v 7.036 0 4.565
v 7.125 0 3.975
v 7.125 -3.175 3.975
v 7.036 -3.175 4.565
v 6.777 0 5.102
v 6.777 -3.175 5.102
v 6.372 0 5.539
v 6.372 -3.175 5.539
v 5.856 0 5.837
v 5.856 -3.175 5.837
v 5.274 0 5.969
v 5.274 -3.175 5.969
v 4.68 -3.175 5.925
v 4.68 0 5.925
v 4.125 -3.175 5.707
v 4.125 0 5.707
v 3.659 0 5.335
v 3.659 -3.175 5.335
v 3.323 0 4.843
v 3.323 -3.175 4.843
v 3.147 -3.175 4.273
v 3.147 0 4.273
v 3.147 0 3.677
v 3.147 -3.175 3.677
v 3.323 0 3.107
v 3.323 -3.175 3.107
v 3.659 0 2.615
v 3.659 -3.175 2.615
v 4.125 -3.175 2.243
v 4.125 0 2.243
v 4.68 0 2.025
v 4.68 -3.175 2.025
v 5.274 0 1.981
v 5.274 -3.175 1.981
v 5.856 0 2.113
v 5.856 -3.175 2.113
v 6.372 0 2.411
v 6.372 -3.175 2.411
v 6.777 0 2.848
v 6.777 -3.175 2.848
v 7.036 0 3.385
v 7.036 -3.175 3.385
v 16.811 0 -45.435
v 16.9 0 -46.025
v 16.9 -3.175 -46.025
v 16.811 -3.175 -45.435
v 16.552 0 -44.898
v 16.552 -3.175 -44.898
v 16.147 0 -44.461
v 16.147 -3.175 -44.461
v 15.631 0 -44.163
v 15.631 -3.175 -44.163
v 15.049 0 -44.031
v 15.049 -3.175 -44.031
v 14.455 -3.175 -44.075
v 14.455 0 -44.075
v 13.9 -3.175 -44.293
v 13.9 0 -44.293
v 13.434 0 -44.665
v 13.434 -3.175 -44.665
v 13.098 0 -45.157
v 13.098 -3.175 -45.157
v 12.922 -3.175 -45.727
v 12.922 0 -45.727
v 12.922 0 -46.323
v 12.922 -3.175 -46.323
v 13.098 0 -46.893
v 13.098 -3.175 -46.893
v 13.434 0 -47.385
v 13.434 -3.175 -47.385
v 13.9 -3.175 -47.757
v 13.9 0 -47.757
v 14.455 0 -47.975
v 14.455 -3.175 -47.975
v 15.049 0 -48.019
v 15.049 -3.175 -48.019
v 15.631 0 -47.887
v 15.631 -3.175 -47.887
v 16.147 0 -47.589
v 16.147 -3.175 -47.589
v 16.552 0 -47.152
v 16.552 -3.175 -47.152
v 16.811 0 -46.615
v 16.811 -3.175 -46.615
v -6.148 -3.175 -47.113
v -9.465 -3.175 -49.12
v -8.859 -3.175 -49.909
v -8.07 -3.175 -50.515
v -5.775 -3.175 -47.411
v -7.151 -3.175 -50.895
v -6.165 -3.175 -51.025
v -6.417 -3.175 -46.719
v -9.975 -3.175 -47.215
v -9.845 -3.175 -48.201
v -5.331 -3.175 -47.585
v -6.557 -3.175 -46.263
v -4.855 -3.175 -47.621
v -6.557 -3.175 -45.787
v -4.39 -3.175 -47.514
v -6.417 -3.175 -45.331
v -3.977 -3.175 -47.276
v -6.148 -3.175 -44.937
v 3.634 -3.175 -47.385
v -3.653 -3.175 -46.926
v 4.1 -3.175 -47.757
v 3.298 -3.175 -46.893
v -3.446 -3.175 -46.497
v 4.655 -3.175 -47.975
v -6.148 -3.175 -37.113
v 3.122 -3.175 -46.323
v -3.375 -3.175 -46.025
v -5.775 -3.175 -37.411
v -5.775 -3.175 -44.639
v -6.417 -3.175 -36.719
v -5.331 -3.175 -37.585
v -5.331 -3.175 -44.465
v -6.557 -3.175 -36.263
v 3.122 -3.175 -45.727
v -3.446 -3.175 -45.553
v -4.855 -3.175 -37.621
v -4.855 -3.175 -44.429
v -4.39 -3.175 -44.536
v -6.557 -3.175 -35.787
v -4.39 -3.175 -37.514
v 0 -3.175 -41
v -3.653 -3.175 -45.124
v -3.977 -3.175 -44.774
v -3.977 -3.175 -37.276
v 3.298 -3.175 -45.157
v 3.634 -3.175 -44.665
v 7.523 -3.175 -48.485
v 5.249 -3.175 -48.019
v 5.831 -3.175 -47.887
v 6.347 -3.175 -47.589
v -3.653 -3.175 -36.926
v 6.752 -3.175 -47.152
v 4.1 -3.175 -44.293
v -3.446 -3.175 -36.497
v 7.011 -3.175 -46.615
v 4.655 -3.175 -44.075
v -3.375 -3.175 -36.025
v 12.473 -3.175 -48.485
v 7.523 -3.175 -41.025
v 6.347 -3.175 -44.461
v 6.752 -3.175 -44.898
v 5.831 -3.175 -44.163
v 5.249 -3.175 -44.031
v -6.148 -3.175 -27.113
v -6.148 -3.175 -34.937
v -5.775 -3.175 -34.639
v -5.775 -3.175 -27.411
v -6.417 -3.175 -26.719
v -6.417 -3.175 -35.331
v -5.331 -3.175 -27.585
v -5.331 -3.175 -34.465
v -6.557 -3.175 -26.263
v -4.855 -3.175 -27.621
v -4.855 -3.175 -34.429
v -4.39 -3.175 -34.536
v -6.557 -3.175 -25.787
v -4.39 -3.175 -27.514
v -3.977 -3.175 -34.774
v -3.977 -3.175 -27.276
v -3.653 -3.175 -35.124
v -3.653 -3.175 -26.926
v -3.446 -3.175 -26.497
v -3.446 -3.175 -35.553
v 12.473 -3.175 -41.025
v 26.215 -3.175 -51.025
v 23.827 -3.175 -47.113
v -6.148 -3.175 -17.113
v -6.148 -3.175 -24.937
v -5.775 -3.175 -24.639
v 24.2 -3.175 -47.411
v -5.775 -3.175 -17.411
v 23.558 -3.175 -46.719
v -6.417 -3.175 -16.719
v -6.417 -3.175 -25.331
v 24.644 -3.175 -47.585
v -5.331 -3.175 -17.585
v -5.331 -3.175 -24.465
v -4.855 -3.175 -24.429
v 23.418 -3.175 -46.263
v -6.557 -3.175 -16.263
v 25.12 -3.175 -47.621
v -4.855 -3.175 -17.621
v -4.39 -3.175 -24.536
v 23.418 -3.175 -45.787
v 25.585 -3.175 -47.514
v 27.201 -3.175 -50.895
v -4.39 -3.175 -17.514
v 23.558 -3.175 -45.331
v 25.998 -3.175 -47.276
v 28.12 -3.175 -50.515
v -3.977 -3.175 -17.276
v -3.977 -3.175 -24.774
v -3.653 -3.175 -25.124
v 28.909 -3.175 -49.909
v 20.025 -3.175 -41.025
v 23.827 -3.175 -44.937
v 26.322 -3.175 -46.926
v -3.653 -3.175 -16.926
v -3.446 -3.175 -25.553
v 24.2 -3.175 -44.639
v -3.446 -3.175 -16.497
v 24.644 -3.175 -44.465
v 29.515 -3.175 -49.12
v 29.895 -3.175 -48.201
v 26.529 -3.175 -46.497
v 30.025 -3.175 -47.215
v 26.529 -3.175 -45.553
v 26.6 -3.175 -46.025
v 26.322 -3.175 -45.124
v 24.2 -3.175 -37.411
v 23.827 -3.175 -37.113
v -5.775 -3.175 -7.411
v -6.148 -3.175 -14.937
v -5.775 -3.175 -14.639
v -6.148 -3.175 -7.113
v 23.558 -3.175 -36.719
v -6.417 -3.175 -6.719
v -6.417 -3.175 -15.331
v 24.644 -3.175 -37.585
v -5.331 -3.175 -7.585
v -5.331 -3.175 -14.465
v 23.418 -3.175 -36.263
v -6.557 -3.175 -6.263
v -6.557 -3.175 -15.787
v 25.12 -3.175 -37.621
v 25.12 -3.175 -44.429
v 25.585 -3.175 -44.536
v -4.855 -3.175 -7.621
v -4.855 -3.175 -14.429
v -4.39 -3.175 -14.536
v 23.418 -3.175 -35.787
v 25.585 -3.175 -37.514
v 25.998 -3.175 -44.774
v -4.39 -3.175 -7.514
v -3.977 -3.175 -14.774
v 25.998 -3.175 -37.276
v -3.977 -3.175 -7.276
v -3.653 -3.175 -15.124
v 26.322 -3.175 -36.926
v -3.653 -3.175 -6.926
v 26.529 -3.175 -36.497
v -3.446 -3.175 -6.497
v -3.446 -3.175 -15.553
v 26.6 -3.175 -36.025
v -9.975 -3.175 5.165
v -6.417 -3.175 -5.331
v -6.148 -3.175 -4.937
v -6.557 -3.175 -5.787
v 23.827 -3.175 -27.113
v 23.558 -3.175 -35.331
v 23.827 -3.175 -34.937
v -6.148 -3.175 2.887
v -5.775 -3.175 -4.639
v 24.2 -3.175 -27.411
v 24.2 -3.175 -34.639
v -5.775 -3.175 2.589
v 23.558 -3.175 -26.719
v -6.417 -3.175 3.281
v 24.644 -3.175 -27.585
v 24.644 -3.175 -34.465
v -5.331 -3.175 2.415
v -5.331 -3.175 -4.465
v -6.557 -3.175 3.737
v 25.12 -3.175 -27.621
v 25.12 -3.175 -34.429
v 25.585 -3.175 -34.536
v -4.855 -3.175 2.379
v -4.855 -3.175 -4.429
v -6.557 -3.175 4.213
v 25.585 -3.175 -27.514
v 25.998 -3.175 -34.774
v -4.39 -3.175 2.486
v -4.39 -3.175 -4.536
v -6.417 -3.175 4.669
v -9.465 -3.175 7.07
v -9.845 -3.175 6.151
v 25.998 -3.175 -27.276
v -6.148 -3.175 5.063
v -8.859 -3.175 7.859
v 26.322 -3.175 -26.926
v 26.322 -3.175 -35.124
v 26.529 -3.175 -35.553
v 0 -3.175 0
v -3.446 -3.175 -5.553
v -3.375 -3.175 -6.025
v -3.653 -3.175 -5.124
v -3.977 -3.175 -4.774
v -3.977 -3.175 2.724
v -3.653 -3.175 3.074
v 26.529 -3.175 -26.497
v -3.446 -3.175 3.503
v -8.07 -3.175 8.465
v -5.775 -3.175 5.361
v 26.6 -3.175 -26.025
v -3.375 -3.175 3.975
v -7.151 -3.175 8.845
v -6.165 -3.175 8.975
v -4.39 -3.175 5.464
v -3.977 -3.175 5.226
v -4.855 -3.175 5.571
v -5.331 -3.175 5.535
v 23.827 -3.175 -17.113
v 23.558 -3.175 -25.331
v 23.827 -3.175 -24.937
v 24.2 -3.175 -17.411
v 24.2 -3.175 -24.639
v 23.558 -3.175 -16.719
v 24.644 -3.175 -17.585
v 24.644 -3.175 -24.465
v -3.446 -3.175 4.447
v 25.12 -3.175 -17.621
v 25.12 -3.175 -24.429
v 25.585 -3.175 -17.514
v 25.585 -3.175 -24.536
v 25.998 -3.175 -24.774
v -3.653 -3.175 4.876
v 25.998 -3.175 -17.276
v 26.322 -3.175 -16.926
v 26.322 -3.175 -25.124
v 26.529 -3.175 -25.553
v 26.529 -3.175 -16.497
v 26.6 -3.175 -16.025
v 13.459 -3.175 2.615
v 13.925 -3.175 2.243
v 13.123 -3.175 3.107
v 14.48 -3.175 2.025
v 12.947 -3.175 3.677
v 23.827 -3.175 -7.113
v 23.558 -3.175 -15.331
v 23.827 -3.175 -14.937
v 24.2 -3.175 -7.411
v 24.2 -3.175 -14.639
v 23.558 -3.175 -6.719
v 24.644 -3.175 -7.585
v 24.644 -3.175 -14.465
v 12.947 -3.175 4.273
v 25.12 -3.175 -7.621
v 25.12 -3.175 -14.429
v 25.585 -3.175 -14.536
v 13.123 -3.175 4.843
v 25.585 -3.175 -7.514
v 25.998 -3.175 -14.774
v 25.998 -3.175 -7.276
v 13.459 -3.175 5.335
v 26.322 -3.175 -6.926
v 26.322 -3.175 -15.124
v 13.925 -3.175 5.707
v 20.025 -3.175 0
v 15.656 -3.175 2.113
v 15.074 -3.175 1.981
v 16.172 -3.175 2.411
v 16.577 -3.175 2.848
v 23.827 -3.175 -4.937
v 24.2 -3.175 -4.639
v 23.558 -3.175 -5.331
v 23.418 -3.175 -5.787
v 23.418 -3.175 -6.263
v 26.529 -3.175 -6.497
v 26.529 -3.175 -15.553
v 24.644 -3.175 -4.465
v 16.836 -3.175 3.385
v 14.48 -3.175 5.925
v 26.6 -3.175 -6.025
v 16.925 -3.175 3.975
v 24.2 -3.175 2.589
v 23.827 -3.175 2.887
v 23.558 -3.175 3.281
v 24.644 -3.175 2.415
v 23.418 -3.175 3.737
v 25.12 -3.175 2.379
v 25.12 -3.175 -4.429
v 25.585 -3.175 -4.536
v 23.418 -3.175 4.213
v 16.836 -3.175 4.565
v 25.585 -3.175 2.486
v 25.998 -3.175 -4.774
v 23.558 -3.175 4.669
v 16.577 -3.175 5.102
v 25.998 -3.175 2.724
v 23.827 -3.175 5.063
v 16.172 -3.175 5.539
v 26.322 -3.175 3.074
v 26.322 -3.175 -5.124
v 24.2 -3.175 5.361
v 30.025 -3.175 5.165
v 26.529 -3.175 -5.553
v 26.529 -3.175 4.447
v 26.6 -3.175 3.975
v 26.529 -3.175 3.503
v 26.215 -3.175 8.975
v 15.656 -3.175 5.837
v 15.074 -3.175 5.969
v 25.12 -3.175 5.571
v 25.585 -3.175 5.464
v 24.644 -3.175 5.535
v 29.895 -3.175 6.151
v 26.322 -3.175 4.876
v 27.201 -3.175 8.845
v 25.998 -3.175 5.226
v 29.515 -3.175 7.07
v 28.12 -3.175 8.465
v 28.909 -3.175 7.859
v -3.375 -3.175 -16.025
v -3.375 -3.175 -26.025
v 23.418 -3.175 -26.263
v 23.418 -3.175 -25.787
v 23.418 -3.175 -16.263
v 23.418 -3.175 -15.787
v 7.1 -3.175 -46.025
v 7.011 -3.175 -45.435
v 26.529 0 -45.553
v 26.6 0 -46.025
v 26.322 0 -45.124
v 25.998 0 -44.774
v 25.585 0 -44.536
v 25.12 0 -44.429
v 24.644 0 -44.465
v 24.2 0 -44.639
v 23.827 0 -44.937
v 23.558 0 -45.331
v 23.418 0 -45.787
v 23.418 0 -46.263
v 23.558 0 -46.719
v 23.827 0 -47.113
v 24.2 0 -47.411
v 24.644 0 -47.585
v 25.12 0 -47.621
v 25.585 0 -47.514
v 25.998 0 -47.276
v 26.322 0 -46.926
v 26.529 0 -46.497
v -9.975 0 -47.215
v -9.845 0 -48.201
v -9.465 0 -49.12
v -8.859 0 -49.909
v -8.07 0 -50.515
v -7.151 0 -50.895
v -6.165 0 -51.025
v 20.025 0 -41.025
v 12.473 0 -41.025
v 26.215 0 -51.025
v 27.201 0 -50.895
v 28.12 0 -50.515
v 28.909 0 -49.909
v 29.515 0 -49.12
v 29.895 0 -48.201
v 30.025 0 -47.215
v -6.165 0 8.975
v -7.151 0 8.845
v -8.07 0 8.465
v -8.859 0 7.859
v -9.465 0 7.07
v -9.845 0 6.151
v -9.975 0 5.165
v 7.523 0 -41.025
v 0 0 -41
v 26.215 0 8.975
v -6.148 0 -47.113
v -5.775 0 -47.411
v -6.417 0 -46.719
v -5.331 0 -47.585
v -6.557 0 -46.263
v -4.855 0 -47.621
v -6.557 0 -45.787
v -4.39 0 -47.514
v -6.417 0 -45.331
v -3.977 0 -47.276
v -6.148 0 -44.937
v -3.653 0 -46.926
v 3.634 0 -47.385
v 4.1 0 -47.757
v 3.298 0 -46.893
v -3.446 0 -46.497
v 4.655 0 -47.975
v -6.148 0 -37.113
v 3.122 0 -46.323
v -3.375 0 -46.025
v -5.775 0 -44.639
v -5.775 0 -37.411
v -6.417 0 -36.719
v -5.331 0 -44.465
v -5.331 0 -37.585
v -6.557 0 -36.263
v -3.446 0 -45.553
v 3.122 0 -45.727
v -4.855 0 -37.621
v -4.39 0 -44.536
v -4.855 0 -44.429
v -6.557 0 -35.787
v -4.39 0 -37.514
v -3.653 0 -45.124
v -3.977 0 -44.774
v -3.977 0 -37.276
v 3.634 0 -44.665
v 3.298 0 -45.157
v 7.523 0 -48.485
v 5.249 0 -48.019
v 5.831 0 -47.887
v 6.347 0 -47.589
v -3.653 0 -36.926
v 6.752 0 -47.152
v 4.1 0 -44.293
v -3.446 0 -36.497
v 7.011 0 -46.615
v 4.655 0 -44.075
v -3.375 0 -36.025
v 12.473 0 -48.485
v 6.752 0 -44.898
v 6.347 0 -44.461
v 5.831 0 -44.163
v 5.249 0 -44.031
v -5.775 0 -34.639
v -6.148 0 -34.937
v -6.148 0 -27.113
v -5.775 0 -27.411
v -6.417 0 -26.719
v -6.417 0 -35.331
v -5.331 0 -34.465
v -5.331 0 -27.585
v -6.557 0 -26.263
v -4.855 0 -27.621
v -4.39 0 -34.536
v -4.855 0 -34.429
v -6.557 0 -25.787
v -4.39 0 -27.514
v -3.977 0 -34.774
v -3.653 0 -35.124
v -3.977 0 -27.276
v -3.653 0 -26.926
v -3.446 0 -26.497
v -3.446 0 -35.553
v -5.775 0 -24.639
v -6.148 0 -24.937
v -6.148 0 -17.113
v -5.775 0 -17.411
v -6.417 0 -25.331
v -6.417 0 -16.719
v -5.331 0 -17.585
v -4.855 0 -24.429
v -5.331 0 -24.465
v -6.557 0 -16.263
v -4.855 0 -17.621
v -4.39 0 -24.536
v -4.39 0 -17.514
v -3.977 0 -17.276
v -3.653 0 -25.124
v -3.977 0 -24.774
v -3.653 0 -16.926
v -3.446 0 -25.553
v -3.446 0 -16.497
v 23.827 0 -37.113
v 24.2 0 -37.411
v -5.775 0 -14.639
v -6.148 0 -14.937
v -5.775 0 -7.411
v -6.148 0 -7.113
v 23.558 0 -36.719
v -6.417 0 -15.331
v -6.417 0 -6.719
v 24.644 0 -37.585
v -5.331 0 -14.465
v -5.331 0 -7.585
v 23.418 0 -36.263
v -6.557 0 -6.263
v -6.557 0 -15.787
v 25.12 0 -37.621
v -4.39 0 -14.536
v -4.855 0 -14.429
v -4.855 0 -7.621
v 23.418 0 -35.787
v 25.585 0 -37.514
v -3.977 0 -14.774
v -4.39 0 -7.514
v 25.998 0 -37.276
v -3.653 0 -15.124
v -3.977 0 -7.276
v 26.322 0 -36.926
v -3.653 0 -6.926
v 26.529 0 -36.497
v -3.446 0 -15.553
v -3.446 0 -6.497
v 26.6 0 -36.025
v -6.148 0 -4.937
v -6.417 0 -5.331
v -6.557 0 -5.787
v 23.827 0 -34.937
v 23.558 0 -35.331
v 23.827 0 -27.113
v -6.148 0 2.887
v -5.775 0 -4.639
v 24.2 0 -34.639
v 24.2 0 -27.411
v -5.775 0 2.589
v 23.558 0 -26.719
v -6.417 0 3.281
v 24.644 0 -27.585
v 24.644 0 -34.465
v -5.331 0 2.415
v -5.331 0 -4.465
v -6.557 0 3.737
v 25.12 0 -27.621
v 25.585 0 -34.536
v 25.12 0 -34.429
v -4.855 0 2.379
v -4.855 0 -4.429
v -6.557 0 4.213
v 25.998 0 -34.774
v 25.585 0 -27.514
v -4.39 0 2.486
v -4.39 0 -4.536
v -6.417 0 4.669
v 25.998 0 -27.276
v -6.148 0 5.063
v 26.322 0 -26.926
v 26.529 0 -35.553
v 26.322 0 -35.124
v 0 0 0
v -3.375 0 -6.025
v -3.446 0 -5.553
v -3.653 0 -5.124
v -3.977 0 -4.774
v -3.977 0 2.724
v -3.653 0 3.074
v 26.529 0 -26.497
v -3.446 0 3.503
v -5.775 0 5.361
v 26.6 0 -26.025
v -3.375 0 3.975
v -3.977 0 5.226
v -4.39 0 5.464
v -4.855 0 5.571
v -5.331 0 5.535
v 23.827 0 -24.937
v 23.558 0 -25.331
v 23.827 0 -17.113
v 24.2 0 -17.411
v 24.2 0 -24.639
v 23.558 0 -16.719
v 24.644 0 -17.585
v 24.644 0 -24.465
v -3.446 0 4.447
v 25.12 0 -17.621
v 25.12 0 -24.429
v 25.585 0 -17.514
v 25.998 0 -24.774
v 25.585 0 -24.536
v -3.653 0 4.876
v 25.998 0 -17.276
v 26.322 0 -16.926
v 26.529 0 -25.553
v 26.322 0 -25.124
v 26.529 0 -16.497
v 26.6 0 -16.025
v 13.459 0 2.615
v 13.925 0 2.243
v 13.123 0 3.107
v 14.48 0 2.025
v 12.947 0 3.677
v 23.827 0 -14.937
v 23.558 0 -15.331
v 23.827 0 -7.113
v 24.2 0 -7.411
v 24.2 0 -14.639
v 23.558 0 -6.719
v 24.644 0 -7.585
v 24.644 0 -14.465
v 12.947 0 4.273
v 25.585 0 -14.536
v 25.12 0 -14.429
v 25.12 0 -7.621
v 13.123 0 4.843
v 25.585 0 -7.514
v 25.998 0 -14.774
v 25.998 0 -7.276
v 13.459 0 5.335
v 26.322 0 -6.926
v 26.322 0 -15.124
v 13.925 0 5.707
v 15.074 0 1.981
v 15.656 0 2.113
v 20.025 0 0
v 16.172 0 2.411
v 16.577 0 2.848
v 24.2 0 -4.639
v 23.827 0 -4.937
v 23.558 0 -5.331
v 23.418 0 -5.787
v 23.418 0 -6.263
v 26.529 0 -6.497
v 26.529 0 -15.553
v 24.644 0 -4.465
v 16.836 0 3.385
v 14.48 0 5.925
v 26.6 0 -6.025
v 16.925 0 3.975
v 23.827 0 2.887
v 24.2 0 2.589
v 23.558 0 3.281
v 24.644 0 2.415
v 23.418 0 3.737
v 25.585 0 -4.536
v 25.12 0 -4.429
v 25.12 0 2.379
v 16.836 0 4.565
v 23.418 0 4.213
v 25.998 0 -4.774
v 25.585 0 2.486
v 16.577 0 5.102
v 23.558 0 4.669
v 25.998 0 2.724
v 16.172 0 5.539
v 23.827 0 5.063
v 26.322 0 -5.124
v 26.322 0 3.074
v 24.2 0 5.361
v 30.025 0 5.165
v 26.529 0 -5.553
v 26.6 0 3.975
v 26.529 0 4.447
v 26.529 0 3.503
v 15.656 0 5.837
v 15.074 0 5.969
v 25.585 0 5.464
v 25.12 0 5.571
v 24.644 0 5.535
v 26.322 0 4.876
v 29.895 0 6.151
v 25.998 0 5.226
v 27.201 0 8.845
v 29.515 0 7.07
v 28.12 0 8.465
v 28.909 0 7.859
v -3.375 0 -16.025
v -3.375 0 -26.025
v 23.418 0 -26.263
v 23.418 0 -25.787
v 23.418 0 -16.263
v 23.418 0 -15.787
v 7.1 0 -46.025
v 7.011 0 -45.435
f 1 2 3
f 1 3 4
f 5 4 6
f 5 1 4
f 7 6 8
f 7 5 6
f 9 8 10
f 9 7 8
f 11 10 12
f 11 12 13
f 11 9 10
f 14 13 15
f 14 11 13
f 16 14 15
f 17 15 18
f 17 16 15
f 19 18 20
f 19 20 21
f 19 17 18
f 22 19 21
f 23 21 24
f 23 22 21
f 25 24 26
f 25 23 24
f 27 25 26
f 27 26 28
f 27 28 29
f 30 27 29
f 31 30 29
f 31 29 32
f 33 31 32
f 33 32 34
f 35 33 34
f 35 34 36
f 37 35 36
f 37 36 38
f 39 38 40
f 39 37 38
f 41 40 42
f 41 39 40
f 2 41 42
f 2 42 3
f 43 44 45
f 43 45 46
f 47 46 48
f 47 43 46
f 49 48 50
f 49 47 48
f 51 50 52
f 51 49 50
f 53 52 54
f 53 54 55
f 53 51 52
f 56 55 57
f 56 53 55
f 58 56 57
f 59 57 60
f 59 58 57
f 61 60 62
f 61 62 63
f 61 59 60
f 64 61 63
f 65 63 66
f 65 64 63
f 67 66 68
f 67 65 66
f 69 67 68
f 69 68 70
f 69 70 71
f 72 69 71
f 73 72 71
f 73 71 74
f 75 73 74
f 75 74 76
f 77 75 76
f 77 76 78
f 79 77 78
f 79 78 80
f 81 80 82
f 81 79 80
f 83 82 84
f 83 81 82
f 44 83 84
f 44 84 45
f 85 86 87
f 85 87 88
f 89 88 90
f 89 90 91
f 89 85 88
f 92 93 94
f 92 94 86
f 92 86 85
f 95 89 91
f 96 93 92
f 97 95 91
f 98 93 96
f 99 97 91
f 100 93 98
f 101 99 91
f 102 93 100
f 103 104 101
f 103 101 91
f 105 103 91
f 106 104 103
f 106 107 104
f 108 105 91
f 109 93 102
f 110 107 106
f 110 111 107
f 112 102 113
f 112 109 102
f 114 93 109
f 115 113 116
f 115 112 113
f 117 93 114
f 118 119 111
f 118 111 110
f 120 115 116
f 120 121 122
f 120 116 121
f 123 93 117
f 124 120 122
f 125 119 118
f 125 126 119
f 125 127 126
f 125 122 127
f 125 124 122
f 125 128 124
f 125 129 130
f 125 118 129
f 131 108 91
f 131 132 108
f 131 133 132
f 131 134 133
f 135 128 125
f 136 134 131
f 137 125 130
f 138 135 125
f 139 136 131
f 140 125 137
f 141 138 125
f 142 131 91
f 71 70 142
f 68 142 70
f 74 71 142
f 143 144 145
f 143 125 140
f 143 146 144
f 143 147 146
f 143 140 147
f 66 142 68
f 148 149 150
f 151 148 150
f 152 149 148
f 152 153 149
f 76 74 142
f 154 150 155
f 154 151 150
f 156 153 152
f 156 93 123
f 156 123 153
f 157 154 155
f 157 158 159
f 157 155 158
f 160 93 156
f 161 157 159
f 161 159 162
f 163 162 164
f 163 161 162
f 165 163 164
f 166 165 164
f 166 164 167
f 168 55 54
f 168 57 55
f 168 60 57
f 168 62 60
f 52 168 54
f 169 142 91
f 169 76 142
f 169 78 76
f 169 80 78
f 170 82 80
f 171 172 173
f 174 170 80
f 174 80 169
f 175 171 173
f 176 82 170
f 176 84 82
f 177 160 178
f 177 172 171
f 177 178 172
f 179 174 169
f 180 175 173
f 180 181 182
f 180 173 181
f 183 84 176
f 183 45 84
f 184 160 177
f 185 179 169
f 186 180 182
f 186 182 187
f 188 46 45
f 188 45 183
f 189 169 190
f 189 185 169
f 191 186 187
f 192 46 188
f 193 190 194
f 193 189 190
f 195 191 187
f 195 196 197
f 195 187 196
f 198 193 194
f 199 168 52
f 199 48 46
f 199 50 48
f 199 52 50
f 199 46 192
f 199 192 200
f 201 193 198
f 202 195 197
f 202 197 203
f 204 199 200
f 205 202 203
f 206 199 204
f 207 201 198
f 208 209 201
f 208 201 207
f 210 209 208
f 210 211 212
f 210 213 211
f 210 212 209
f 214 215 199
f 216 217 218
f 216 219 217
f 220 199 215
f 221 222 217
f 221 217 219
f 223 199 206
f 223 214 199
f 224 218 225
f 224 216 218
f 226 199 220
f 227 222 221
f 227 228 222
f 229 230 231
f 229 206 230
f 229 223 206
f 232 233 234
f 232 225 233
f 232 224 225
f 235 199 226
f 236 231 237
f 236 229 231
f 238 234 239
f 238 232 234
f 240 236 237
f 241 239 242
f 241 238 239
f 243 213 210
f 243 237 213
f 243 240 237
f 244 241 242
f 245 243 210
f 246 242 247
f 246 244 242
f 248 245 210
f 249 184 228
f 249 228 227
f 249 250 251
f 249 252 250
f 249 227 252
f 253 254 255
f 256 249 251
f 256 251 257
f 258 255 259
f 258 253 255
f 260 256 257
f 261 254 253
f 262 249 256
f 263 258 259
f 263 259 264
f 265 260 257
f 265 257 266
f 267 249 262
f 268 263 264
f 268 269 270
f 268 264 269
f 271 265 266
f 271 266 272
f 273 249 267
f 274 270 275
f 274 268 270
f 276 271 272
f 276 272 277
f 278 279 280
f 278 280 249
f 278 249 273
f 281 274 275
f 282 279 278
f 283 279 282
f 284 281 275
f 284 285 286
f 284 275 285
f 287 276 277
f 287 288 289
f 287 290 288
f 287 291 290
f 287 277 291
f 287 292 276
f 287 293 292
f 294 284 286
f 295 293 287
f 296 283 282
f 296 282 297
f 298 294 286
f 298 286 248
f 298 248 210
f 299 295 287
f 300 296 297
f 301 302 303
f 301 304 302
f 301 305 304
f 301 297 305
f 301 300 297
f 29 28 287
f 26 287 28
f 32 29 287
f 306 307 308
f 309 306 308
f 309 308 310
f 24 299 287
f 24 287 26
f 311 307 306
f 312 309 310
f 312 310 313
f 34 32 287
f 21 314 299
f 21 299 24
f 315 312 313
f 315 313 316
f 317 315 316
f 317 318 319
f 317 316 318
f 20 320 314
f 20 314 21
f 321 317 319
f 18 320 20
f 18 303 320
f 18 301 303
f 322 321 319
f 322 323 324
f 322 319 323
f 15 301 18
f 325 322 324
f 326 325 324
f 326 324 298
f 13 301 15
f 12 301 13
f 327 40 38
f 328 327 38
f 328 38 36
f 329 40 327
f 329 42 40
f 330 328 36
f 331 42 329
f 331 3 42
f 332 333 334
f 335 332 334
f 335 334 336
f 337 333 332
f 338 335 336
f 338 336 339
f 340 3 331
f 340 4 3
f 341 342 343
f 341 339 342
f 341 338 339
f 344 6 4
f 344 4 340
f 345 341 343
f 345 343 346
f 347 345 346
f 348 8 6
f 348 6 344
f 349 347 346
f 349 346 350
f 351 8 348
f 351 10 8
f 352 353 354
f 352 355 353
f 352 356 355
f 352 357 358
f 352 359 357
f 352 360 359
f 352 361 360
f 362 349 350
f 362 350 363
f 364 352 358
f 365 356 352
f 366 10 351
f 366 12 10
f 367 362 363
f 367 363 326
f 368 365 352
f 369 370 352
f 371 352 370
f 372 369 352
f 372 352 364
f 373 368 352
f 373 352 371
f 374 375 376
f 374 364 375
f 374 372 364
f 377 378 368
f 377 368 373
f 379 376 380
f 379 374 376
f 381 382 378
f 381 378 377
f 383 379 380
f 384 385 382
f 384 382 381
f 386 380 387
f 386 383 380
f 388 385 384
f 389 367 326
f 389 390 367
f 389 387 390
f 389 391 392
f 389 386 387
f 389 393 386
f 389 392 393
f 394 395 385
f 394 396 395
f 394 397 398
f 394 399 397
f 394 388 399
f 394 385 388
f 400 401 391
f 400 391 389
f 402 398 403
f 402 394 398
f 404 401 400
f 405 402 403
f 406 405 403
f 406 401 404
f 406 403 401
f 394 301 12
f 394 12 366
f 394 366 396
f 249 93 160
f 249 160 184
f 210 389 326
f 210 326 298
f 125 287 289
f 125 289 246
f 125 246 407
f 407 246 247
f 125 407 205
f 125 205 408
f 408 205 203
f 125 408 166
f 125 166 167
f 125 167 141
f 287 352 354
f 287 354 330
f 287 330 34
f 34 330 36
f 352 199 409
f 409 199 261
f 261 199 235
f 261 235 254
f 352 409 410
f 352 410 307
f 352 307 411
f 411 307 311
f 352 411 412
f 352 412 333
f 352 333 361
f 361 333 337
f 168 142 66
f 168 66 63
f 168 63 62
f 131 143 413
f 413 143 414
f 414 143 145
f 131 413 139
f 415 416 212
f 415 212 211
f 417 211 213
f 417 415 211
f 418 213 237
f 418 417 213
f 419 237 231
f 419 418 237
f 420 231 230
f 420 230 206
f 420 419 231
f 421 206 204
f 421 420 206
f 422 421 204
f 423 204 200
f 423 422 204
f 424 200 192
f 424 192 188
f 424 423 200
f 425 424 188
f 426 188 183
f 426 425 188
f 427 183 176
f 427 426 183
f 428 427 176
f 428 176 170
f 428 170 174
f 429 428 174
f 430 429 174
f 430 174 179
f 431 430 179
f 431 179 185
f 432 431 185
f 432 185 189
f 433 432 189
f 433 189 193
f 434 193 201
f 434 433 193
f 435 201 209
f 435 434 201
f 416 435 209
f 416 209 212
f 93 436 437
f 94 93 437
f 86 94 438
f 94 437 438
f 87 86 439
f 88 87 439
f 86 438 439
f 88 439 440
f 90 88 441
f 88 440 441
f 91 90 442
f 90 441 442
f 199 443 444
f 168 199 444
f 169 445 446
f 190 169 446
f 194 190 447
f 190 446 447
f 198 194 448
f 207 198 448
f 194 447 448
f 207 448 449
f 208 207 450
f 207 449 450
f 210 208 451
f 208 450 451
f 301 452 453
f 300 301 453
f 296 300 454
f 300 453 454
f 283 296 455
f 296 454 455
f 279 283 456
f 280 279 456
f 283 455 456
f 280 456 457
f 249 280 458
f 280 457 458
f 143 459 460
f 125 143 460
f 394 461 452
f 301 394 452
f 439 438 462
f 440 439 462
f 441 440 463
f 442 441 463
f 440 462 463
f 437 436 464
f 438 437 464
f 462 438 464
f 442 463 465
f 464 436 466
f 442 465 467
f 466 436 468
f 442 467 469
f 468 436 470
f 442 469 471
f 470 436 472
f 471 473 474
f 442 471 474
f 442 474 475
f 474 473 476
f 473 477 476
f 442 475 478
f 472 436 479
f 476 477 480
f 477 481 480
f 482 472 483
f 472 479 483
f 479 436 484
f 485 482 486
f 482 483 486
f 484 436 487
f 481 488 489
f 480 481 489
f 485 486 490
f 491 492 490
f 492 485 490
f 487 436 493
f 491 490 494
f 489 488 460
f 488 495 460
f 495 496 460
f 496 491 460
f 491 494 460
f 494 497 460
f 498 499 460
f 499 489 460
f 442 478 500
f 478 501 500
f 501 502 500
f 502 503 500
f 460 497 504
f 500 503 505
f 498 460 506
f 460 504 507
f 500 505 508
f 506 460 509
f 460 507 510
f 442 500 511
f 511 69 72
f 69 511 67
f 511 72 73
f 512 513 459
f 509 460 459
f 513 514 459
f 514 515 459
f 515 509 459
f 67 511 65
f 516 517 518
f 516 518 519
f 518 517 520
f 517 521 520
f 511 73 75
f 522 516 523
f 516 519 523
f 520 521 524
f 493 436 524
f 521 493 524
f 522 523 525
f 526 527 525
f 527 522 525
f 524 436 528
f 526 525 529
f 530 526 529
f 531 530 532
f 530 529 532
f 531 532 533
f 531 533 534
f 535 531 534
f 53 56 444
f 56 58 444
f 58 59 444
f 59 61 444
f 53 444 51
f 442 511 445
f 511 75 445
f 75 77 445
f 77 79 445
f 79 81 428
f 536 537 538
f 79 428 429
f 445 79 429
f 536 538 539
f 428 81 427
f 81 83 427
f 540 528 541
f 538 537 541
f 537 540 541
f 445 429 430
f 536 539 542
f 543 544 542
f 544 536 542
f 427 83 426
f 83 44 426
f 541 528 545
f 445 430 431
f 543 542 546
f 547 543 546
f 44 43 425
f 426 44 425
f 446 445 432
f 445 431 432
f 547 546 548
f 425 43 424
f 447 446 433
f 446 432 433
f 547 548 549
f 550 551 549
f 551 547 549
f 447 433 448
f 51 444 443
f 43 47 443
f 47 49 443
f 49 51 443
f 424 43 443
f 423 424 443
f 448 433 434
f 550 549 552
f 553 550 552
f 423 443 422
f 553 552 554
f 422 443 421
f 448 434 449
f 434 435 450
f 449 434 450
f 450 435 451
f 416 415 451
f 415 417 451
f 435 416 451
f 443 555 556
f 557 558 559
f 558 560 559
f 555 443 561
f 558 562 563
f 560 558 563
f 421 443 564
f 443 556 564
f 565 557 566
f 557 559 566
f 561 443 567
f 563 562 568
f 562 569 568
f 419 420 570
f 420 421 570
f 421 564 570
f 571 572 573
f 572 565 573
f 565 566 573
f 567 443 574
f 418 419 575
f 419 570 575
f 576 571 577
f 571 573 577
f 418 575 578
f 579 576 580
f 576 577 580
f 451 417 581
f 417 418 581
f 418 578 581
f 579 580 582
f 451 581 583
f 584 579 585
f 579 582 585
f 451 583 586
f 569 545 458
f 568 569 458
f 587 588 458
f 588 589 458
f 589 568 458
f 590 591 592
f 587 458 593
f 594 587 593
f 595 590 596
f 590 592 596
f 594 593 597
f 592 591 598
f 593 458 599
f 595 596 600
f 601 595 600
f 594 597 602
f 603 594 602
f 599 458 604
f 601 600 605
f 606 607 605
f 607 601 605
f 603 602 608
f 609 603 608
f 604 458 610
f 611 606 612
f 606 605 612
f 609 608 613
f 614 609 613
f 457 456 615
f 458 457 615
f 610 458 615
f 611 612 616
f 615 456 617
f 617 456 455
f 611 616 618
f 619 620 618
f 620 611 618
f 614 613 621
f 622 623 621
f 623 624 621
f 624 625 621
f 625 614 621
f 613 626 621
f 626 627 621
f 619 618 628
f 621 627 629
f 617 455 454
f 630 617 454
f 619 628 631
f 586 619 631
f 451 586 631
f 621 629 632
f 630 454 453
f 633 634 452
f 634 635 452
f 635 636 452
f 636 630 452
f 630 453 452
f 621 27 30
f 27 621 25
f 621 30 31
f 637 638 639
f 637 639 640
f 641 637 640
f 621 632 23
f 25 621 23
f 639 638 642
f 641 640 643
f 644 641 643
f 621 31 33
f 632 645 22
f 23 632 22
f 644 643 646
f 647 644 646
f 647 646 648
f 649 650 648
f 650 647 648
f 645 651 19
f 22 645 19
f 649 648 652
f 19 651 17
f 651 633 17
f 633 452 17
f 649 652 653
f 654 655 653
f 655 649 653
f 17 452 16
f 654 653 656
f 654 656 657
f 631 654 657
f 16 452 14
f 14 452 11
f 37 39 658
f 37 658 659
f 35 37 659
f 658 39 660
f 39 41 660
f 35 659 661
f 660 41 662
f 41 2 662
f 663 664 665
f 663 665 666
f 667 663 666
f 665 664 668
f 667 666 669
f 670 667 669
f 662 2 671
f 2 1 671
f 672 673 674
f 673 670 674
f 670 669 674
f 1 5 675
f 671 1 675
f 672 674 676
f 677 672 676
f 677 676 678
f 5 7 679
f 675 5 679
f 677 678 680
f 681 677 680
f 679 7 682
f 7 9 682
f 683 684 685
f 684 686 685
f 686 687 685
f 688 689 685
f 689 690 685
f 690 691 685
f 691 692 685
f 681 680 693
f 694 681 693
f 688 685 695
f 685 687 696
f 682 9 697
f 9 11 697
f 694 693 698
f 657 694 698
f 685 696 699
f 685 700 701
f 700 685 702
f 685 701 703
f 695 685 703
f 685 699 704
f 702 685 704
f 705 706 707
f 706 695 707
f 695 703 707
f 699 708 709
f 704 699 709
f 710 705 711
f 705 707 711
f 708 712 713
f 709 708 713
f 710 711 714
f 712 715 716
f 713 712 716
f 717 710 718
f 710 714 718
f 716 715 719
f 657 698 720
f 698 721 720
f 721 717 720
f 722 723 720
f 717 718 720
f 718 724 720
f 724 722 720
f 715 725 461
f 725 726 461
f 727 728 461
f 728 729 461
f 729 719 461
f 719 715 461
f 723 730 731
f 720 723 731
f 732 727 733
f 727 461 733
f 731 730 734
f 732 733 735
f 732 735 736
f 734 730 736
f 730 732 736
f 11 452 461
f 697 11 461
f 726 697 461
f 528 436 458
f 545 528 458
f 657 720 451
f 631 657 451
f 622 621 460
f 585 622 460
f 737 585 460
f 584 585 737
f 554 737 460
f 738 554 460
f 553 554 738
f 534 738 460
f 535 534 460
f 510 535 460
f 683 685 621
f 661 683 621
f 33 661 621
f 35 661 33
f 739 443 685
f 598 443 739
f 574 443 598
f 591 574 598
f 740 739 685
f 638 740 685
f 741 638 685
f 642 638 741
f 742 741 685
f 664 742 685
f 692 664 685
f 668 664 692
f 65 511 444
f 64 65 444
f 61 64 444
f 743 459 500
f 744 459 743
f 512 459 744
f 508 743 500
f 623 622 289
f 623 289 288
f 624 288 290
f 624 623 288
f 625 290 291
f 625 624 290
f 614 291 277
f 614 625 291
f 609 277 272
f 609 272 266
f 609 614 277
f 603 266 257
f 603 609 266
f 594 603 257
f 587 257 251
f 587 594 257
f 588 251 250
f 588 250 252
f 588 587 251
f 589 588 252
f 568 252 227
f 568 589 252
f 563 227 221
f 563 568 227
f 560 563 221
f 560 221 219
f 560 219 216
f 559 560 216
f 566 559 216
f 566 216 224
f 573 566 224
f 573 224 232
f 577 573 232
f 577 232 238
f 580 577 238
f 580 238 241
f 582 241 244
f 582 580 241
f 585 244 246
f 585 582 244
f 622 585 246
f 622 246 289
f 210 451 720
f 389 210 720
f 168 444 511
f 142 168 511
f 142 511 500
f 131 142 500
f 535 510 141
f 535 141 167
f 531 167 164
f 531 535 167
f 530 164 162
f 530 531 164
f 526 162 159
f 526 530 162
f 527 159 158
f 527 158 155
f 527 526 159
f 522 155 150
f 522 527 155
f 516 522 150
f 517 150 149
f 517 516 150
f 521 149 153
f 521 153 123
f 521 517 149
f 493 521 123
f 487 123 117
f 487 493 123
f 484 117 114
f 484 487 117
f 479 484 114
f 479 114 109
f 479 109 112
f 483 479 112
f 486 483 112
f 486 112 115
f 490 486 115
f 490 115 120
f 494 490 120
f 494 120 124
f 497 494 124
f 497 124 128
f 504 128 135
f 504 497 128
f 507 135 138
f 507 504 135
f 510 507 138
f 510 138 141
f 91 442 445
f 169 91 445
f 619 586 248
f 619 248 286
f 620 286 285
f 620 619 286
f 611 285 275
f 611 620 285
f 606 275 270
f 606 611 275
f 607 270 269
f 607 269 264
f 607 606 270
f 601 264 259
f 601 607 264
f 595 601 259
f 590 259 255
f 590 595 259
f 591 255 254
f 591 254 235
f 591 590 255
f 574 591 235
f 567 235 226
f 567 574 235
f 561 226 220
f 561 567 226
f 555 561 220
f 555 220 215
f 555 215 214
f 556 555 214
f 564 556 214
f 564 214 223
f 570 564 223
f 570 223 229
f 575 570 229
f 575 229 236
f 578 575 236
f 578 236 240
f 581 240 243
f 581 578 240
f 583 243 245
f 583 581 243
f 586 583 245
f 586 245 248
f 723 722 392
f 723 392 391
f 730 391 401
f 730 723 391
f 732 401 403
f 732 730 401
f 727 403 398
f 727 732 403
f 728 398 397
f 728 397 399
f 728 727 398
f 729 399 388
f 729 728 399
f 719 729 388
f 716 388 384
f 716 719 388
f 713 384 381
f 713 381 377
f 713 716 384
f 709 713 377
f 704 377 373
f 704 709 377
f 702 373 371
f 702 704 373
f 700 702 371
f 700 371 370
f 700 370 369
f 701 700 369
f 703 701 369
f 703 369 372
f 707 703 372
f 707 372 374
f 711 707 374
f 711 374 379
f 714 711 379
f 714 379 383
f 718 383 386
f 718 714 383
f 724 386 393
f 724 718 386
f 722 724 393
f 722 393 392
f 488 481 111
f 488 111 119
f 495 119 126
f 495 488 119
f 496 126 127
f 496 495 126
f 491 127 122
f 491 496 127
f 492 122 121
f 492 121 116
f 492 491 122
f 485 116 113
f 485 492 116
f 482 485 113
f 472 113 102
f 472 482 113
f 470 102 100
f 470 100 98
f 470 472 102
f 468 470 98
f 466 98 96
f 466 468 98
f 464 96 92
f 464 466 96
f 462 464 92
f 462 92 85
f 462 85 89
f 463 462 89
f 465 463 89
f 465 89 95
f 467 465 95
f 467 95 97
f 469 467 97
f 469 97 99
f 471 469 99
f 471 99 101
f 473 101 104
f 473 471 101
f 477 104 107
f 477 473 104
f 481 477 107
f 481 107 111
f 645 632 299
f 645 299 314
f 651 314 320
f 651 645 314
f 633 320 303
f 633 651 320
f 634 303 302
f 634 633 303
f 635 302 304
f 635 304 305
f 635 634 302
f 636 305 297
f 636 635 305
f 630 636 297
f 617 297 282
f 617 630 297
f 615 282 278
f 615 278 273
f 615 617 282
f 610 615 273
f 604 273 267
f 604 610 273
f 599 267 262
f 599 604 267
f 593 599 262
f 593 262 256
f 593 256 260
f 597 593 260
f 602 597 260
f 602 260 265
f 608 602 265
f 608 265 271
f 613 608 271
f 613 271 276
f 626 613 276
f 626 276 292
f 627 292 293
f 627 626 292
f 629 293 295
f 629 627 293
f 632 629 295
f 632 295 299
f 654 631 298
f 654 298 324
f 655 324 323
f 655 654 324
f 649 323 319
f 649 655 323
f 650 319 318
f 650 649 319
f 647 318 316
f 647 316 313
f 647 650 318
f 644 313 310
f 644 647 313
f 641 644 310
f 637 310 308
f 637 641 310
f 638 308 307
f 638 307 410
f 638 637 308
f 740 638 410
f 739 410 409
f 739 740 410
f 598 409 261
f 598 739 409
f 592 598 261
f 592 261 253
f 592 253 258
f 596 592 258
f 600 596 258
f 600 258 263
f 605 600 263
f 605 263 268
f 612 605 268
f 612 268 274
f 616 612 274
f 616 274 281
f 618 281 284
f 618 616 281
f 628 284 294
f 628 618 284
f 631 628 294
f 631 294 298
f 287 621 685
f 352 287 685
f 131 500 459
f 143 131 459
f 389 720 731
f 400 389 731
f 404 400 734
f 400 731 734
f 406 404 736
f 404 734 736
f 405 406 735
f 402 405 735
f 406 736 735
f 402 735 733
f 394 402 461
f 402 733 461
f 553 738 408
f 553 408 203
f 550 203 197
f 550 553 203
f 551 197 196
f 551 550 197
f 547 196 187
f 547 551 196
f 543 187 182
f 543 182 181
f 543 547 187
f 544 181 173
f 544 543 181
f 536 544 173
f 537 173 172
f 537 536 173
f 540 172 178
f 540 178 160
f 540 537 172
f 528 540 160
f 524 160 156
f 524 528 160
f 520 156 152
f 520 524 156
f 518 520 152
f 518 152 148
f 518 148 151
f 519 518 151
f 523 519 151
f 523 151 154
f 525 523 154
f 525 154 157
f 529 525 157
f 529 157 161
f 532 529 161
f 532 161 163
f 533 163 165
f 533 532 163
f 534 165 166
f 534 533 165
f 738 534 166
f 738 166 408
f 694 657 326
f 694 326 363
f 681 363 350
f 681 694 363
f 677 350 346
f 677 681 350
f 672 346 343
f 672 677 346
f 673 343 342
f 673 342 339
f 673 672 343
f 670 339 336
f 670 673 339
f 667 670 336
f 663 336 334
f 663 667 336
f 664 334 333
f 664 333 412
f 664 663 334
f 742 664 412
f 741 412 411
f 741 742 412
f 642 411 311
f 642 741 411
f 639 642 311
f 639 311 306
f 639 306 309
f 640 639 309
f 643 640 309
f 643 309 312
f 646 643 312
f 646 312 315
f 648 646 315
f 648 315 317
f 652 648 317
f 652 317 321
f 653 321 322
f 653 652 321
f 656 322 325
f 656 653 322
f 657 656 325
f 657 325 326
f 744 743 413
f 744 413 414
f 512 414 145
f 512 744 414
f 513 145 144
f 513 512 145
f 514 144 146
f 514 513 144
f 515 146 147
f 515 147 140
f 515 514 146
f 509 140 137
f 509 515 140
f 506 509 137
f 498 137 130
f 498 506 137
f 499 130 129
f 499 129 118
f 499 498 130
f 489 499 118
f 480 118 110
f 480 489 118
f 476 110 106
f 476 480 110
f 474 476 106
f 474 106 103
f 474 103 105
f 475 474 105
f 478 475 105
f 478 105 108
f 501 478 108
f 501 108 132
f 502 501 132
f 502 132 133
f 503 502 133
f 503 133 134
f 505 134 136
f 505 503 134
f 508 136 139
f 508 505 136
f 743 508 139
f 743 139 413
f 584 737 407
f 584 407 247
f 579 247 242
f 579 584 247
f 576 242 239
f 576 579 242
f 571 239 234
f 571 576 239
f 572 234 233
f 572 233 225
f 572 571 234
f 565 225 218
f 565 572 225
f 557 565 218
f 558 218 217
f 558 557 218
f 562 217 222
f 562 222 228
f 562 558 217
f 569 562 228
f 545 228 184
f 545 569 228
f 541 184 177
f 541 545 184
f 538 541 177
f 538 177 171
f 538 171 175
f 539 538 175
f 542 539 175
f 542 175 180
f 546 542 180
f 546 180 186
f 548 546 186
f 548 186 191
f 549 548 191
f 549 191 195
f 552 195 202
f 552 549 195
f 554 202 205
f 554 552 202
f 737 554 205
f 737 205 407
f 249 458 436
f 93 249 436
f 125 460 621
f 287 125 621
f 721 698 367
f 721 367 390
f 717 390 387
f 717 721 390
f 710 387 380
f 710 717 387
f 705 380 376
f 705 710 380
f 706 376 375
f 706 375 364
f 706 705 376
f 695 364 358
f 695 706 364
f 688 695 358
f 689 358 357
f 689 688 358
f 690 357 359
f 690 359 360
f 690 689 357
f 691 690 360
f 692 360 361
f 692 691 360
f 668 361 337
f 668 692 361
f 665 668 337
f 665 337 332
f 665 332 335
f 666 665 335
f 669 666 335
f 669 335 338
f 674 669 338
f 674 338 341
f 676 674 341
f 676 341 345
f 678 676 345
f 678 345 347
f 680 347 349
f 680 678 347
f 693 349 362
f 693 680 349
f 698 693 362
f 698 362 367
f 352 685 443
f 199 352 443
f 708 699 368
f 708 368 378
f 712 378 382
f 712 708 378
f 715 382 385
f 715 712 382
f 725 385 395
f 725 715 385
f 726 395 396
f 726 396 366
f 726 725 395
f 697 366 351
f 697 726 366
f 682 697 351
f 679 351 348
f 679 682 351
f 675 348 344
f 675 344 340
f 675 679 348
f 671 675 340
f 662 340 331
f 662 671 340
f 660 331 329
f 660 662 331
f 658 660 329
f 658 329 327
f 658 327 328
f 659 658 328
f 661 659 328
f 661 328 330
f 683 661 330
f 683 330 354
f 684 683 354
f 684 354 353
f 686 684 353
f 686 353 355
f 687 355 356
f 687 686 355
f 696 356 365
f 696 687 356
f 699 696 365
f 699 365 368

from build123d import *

# Parameters (mm, degrees)
F0_R     = 1.6
F0_R_2   = 2
F1_DEPTH = 3.175


# Not quite as in the source:
# - a length typed as a fraction of an inch, garbled in the dataset ("3 / 203.2 mm" for 3/8 in), is restored


with BuildPart() as f1:
    # F0 (on Front) → F1 (new body)
    with BuildSketch(Plane.XZ):
        with BuildLine():
            Line((26.215, 8.975), (-6.165, 8.975))
            ThreePointArc((-6.165, 8.975), (-8.8590768363, 7.8590768363), (-9.975, 5.165))
            Line((-9.975, 5.165), (-9.975, -47.215))
            ThreePointArc((-9.975, -47.215), (-8.8590768363, -49.9090768363), (-6.165, -51.025))
            Line((-6.165, -51.025), (26.215, -51.025))
            ThreePointArc((26.215, -51.025), (28.9090768363, -49.9090768363), (30.025, -47.215))
            Line((30.025, -47.215), (30.025, 5.165))
            ThreePointArc((30.025, 5.165), (28.9090768363, 7.8590768363), (26.215, 8.975))
        make_face()
        with Locations((-4.975, -46.025)):
            Circle(F0_R, mode=Mode.SUBTRACT)
        with Locations((5.1, -46.025)):
            Circle(F0_R_2, mode=Mode.SUBTRACT)
        with Locations((-4.975, -36.025)):
            Circle(F0_R, mode=Mode.SUBTRACT)
        with Locations((-4.975, -26.025)):
            Circle(F0_R, mode=Mode.SUBTRACT)
        Polygon((0, -41), (0, 0), (20.025, 0), (20.025, -41.025), (12.4728614733, -41.025), (12.4728614733, -48.485), (7.5228614733, -48.485), (7.5228614733, -41.025), align=None, mode=Mode.SUBTRACT)
        with Locations((14.9, -46.025)):
            Circle(F0_R_2, mode=Mode.SUBTRACT)
        with Locations((25, -46.025)):
            Circle(F0_R, mode=Mode.SUBTRACT)
        with Locations((25, -36.025)):
            Circle(F0_R, mode=Mode.SUBTRACT)
        with Locations((25, -26.025)):
            Circle(F0_R, mode=Mode.SUBTRACT)
        with Locations((-4.975, -16.025)):
            Circle(F0_R, mode=Mode.SUBTRACT)
        with Locations((-4.975, -6.025)):
            Circle(F0_R, mode=Mode.SUBTRACT)
        with Locations((-4.975, 3.975)):
            Circle(F0_R, mode=Mode.SUBTRACT)
        with Locations((5.125, 3.975)):
            Circle(F0_R_2, mode=Mode.SUBTRACT)
        with Locations((25, -16.025)):
            Circle(F0_R, mode=Mode.SUBTRACT)
        with Locations((14.925, 3.975)):
            Circle(F0_R_2, mode=Mode.SUBTRACT)
        with Locations((25, -6.025)):
            Circle(F0_R, mode=Mode.SUBTRACT)
        with Locations((25, 3.975)):
            Circle(F0_R, mode=Mode.SUBTRACT)
    extrude(amount=F1_DEPTH)


solid = f1.part
